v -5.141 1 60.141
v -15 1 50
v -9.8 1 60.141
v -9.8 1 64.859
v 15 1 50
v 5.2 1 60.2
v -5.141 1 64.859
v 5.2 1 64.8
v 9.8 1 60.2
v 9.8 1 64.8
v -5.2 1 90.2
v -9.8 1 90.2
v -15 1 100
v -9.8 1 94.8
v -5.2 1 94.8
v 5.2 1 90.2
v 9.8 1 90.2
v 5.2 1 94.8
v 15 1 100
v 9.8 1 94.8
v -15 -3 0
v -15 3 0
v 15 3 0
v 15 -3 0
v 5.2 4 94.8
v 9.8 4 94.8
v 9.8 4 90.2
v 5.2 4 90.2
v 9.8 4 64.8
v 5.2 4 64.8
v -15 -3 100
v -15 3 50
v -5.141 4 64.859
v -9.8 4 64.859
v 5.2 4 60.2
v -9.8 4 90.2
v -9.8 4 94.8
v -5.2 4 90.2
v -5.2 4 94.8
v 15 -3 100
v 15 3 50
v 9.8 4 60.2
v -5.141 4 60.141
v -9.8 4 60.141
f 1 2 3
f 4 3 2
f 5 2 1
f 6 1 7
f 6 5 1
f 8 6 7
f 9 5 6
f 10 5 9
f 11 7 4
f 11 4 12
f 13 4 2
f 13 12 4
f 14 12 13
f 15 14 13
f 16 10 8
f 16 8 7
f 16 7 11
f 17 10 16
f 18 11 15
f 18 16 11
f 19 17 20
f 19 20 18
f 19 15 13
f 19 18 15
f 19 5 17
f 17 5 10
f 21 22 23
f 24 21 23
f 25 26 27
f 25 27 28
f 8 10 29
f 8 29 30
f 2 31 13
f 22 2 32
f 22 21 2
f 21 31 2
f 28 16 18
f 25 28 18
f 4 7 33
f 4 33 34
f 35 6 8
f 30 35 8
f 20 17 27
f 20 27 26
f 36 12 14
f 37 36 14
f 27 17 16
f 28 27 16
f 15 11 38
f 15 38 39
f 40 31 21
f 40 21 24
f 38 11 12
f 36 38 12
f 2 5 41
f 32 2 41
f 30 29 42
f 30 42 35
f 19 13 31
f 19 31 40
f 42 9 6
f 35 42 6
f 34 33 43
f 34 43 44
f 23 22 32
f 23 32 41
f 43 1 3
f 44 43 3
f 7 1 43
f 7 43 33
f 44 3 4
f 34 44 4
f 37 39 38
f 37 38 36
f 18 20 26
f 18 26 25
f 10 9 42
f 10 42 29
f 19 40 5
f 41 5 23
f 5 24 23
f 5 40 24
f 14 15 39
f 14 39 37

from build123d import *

# Parameters (mm, degrees)
F0_W     = 30
F0_H     = 6
F1_DEPTH = 100
F2_W     = 2
F2_H     = 50
F3_DEPTH = 30
F4_W     = 4.600006
F4_H     = 4.600006
F4_W_2   = 4.600004
F4_H_2   = 4.600004
F4_W_3   = 4.658593
F4_H_3   = 4.717186
F5_DEPTH = 3


with BuildPart() as f1:
    # F0 (on Top) → F1 (new body)
    with BuildSketch(Plane.XY):
        Rectangle(F0_W, F0_H)
    extrude(amount=F1_DEPTH)

    # F2 (on face) → F3 (cut, through all)
    with BuildSketch(Plane.YZ.offset(15)):
        with Locations((2, 75)):
            Rectangle(F2_W, F2_H)
    extrude(amount=-F3_DEPTH, mode=Mode.SUBTRACT)

    # F4 (on face) → F5 (join)
    with BuildSketch(Plane(origin=(0, 1, 0), x_dir=(-1, 0, 0), z_dir=(0, 1, 0))):
        with Locations((-7.5, 92.5)):
            Rectangle(F4_W, F4_H)
        with Locations((7.5, 92.5)):
            Rectangle(F4_W, F4_H)
        with Locations((-7.5, 62.5)):
            Rectangle(F4_W_2, F4_H_2)
        with Locations((7.470703, 62.5)):
            Rectangle(F4_W_3, F4_H_3)
    extrude(amount=F5_DEPTH)


solid = f1.part
